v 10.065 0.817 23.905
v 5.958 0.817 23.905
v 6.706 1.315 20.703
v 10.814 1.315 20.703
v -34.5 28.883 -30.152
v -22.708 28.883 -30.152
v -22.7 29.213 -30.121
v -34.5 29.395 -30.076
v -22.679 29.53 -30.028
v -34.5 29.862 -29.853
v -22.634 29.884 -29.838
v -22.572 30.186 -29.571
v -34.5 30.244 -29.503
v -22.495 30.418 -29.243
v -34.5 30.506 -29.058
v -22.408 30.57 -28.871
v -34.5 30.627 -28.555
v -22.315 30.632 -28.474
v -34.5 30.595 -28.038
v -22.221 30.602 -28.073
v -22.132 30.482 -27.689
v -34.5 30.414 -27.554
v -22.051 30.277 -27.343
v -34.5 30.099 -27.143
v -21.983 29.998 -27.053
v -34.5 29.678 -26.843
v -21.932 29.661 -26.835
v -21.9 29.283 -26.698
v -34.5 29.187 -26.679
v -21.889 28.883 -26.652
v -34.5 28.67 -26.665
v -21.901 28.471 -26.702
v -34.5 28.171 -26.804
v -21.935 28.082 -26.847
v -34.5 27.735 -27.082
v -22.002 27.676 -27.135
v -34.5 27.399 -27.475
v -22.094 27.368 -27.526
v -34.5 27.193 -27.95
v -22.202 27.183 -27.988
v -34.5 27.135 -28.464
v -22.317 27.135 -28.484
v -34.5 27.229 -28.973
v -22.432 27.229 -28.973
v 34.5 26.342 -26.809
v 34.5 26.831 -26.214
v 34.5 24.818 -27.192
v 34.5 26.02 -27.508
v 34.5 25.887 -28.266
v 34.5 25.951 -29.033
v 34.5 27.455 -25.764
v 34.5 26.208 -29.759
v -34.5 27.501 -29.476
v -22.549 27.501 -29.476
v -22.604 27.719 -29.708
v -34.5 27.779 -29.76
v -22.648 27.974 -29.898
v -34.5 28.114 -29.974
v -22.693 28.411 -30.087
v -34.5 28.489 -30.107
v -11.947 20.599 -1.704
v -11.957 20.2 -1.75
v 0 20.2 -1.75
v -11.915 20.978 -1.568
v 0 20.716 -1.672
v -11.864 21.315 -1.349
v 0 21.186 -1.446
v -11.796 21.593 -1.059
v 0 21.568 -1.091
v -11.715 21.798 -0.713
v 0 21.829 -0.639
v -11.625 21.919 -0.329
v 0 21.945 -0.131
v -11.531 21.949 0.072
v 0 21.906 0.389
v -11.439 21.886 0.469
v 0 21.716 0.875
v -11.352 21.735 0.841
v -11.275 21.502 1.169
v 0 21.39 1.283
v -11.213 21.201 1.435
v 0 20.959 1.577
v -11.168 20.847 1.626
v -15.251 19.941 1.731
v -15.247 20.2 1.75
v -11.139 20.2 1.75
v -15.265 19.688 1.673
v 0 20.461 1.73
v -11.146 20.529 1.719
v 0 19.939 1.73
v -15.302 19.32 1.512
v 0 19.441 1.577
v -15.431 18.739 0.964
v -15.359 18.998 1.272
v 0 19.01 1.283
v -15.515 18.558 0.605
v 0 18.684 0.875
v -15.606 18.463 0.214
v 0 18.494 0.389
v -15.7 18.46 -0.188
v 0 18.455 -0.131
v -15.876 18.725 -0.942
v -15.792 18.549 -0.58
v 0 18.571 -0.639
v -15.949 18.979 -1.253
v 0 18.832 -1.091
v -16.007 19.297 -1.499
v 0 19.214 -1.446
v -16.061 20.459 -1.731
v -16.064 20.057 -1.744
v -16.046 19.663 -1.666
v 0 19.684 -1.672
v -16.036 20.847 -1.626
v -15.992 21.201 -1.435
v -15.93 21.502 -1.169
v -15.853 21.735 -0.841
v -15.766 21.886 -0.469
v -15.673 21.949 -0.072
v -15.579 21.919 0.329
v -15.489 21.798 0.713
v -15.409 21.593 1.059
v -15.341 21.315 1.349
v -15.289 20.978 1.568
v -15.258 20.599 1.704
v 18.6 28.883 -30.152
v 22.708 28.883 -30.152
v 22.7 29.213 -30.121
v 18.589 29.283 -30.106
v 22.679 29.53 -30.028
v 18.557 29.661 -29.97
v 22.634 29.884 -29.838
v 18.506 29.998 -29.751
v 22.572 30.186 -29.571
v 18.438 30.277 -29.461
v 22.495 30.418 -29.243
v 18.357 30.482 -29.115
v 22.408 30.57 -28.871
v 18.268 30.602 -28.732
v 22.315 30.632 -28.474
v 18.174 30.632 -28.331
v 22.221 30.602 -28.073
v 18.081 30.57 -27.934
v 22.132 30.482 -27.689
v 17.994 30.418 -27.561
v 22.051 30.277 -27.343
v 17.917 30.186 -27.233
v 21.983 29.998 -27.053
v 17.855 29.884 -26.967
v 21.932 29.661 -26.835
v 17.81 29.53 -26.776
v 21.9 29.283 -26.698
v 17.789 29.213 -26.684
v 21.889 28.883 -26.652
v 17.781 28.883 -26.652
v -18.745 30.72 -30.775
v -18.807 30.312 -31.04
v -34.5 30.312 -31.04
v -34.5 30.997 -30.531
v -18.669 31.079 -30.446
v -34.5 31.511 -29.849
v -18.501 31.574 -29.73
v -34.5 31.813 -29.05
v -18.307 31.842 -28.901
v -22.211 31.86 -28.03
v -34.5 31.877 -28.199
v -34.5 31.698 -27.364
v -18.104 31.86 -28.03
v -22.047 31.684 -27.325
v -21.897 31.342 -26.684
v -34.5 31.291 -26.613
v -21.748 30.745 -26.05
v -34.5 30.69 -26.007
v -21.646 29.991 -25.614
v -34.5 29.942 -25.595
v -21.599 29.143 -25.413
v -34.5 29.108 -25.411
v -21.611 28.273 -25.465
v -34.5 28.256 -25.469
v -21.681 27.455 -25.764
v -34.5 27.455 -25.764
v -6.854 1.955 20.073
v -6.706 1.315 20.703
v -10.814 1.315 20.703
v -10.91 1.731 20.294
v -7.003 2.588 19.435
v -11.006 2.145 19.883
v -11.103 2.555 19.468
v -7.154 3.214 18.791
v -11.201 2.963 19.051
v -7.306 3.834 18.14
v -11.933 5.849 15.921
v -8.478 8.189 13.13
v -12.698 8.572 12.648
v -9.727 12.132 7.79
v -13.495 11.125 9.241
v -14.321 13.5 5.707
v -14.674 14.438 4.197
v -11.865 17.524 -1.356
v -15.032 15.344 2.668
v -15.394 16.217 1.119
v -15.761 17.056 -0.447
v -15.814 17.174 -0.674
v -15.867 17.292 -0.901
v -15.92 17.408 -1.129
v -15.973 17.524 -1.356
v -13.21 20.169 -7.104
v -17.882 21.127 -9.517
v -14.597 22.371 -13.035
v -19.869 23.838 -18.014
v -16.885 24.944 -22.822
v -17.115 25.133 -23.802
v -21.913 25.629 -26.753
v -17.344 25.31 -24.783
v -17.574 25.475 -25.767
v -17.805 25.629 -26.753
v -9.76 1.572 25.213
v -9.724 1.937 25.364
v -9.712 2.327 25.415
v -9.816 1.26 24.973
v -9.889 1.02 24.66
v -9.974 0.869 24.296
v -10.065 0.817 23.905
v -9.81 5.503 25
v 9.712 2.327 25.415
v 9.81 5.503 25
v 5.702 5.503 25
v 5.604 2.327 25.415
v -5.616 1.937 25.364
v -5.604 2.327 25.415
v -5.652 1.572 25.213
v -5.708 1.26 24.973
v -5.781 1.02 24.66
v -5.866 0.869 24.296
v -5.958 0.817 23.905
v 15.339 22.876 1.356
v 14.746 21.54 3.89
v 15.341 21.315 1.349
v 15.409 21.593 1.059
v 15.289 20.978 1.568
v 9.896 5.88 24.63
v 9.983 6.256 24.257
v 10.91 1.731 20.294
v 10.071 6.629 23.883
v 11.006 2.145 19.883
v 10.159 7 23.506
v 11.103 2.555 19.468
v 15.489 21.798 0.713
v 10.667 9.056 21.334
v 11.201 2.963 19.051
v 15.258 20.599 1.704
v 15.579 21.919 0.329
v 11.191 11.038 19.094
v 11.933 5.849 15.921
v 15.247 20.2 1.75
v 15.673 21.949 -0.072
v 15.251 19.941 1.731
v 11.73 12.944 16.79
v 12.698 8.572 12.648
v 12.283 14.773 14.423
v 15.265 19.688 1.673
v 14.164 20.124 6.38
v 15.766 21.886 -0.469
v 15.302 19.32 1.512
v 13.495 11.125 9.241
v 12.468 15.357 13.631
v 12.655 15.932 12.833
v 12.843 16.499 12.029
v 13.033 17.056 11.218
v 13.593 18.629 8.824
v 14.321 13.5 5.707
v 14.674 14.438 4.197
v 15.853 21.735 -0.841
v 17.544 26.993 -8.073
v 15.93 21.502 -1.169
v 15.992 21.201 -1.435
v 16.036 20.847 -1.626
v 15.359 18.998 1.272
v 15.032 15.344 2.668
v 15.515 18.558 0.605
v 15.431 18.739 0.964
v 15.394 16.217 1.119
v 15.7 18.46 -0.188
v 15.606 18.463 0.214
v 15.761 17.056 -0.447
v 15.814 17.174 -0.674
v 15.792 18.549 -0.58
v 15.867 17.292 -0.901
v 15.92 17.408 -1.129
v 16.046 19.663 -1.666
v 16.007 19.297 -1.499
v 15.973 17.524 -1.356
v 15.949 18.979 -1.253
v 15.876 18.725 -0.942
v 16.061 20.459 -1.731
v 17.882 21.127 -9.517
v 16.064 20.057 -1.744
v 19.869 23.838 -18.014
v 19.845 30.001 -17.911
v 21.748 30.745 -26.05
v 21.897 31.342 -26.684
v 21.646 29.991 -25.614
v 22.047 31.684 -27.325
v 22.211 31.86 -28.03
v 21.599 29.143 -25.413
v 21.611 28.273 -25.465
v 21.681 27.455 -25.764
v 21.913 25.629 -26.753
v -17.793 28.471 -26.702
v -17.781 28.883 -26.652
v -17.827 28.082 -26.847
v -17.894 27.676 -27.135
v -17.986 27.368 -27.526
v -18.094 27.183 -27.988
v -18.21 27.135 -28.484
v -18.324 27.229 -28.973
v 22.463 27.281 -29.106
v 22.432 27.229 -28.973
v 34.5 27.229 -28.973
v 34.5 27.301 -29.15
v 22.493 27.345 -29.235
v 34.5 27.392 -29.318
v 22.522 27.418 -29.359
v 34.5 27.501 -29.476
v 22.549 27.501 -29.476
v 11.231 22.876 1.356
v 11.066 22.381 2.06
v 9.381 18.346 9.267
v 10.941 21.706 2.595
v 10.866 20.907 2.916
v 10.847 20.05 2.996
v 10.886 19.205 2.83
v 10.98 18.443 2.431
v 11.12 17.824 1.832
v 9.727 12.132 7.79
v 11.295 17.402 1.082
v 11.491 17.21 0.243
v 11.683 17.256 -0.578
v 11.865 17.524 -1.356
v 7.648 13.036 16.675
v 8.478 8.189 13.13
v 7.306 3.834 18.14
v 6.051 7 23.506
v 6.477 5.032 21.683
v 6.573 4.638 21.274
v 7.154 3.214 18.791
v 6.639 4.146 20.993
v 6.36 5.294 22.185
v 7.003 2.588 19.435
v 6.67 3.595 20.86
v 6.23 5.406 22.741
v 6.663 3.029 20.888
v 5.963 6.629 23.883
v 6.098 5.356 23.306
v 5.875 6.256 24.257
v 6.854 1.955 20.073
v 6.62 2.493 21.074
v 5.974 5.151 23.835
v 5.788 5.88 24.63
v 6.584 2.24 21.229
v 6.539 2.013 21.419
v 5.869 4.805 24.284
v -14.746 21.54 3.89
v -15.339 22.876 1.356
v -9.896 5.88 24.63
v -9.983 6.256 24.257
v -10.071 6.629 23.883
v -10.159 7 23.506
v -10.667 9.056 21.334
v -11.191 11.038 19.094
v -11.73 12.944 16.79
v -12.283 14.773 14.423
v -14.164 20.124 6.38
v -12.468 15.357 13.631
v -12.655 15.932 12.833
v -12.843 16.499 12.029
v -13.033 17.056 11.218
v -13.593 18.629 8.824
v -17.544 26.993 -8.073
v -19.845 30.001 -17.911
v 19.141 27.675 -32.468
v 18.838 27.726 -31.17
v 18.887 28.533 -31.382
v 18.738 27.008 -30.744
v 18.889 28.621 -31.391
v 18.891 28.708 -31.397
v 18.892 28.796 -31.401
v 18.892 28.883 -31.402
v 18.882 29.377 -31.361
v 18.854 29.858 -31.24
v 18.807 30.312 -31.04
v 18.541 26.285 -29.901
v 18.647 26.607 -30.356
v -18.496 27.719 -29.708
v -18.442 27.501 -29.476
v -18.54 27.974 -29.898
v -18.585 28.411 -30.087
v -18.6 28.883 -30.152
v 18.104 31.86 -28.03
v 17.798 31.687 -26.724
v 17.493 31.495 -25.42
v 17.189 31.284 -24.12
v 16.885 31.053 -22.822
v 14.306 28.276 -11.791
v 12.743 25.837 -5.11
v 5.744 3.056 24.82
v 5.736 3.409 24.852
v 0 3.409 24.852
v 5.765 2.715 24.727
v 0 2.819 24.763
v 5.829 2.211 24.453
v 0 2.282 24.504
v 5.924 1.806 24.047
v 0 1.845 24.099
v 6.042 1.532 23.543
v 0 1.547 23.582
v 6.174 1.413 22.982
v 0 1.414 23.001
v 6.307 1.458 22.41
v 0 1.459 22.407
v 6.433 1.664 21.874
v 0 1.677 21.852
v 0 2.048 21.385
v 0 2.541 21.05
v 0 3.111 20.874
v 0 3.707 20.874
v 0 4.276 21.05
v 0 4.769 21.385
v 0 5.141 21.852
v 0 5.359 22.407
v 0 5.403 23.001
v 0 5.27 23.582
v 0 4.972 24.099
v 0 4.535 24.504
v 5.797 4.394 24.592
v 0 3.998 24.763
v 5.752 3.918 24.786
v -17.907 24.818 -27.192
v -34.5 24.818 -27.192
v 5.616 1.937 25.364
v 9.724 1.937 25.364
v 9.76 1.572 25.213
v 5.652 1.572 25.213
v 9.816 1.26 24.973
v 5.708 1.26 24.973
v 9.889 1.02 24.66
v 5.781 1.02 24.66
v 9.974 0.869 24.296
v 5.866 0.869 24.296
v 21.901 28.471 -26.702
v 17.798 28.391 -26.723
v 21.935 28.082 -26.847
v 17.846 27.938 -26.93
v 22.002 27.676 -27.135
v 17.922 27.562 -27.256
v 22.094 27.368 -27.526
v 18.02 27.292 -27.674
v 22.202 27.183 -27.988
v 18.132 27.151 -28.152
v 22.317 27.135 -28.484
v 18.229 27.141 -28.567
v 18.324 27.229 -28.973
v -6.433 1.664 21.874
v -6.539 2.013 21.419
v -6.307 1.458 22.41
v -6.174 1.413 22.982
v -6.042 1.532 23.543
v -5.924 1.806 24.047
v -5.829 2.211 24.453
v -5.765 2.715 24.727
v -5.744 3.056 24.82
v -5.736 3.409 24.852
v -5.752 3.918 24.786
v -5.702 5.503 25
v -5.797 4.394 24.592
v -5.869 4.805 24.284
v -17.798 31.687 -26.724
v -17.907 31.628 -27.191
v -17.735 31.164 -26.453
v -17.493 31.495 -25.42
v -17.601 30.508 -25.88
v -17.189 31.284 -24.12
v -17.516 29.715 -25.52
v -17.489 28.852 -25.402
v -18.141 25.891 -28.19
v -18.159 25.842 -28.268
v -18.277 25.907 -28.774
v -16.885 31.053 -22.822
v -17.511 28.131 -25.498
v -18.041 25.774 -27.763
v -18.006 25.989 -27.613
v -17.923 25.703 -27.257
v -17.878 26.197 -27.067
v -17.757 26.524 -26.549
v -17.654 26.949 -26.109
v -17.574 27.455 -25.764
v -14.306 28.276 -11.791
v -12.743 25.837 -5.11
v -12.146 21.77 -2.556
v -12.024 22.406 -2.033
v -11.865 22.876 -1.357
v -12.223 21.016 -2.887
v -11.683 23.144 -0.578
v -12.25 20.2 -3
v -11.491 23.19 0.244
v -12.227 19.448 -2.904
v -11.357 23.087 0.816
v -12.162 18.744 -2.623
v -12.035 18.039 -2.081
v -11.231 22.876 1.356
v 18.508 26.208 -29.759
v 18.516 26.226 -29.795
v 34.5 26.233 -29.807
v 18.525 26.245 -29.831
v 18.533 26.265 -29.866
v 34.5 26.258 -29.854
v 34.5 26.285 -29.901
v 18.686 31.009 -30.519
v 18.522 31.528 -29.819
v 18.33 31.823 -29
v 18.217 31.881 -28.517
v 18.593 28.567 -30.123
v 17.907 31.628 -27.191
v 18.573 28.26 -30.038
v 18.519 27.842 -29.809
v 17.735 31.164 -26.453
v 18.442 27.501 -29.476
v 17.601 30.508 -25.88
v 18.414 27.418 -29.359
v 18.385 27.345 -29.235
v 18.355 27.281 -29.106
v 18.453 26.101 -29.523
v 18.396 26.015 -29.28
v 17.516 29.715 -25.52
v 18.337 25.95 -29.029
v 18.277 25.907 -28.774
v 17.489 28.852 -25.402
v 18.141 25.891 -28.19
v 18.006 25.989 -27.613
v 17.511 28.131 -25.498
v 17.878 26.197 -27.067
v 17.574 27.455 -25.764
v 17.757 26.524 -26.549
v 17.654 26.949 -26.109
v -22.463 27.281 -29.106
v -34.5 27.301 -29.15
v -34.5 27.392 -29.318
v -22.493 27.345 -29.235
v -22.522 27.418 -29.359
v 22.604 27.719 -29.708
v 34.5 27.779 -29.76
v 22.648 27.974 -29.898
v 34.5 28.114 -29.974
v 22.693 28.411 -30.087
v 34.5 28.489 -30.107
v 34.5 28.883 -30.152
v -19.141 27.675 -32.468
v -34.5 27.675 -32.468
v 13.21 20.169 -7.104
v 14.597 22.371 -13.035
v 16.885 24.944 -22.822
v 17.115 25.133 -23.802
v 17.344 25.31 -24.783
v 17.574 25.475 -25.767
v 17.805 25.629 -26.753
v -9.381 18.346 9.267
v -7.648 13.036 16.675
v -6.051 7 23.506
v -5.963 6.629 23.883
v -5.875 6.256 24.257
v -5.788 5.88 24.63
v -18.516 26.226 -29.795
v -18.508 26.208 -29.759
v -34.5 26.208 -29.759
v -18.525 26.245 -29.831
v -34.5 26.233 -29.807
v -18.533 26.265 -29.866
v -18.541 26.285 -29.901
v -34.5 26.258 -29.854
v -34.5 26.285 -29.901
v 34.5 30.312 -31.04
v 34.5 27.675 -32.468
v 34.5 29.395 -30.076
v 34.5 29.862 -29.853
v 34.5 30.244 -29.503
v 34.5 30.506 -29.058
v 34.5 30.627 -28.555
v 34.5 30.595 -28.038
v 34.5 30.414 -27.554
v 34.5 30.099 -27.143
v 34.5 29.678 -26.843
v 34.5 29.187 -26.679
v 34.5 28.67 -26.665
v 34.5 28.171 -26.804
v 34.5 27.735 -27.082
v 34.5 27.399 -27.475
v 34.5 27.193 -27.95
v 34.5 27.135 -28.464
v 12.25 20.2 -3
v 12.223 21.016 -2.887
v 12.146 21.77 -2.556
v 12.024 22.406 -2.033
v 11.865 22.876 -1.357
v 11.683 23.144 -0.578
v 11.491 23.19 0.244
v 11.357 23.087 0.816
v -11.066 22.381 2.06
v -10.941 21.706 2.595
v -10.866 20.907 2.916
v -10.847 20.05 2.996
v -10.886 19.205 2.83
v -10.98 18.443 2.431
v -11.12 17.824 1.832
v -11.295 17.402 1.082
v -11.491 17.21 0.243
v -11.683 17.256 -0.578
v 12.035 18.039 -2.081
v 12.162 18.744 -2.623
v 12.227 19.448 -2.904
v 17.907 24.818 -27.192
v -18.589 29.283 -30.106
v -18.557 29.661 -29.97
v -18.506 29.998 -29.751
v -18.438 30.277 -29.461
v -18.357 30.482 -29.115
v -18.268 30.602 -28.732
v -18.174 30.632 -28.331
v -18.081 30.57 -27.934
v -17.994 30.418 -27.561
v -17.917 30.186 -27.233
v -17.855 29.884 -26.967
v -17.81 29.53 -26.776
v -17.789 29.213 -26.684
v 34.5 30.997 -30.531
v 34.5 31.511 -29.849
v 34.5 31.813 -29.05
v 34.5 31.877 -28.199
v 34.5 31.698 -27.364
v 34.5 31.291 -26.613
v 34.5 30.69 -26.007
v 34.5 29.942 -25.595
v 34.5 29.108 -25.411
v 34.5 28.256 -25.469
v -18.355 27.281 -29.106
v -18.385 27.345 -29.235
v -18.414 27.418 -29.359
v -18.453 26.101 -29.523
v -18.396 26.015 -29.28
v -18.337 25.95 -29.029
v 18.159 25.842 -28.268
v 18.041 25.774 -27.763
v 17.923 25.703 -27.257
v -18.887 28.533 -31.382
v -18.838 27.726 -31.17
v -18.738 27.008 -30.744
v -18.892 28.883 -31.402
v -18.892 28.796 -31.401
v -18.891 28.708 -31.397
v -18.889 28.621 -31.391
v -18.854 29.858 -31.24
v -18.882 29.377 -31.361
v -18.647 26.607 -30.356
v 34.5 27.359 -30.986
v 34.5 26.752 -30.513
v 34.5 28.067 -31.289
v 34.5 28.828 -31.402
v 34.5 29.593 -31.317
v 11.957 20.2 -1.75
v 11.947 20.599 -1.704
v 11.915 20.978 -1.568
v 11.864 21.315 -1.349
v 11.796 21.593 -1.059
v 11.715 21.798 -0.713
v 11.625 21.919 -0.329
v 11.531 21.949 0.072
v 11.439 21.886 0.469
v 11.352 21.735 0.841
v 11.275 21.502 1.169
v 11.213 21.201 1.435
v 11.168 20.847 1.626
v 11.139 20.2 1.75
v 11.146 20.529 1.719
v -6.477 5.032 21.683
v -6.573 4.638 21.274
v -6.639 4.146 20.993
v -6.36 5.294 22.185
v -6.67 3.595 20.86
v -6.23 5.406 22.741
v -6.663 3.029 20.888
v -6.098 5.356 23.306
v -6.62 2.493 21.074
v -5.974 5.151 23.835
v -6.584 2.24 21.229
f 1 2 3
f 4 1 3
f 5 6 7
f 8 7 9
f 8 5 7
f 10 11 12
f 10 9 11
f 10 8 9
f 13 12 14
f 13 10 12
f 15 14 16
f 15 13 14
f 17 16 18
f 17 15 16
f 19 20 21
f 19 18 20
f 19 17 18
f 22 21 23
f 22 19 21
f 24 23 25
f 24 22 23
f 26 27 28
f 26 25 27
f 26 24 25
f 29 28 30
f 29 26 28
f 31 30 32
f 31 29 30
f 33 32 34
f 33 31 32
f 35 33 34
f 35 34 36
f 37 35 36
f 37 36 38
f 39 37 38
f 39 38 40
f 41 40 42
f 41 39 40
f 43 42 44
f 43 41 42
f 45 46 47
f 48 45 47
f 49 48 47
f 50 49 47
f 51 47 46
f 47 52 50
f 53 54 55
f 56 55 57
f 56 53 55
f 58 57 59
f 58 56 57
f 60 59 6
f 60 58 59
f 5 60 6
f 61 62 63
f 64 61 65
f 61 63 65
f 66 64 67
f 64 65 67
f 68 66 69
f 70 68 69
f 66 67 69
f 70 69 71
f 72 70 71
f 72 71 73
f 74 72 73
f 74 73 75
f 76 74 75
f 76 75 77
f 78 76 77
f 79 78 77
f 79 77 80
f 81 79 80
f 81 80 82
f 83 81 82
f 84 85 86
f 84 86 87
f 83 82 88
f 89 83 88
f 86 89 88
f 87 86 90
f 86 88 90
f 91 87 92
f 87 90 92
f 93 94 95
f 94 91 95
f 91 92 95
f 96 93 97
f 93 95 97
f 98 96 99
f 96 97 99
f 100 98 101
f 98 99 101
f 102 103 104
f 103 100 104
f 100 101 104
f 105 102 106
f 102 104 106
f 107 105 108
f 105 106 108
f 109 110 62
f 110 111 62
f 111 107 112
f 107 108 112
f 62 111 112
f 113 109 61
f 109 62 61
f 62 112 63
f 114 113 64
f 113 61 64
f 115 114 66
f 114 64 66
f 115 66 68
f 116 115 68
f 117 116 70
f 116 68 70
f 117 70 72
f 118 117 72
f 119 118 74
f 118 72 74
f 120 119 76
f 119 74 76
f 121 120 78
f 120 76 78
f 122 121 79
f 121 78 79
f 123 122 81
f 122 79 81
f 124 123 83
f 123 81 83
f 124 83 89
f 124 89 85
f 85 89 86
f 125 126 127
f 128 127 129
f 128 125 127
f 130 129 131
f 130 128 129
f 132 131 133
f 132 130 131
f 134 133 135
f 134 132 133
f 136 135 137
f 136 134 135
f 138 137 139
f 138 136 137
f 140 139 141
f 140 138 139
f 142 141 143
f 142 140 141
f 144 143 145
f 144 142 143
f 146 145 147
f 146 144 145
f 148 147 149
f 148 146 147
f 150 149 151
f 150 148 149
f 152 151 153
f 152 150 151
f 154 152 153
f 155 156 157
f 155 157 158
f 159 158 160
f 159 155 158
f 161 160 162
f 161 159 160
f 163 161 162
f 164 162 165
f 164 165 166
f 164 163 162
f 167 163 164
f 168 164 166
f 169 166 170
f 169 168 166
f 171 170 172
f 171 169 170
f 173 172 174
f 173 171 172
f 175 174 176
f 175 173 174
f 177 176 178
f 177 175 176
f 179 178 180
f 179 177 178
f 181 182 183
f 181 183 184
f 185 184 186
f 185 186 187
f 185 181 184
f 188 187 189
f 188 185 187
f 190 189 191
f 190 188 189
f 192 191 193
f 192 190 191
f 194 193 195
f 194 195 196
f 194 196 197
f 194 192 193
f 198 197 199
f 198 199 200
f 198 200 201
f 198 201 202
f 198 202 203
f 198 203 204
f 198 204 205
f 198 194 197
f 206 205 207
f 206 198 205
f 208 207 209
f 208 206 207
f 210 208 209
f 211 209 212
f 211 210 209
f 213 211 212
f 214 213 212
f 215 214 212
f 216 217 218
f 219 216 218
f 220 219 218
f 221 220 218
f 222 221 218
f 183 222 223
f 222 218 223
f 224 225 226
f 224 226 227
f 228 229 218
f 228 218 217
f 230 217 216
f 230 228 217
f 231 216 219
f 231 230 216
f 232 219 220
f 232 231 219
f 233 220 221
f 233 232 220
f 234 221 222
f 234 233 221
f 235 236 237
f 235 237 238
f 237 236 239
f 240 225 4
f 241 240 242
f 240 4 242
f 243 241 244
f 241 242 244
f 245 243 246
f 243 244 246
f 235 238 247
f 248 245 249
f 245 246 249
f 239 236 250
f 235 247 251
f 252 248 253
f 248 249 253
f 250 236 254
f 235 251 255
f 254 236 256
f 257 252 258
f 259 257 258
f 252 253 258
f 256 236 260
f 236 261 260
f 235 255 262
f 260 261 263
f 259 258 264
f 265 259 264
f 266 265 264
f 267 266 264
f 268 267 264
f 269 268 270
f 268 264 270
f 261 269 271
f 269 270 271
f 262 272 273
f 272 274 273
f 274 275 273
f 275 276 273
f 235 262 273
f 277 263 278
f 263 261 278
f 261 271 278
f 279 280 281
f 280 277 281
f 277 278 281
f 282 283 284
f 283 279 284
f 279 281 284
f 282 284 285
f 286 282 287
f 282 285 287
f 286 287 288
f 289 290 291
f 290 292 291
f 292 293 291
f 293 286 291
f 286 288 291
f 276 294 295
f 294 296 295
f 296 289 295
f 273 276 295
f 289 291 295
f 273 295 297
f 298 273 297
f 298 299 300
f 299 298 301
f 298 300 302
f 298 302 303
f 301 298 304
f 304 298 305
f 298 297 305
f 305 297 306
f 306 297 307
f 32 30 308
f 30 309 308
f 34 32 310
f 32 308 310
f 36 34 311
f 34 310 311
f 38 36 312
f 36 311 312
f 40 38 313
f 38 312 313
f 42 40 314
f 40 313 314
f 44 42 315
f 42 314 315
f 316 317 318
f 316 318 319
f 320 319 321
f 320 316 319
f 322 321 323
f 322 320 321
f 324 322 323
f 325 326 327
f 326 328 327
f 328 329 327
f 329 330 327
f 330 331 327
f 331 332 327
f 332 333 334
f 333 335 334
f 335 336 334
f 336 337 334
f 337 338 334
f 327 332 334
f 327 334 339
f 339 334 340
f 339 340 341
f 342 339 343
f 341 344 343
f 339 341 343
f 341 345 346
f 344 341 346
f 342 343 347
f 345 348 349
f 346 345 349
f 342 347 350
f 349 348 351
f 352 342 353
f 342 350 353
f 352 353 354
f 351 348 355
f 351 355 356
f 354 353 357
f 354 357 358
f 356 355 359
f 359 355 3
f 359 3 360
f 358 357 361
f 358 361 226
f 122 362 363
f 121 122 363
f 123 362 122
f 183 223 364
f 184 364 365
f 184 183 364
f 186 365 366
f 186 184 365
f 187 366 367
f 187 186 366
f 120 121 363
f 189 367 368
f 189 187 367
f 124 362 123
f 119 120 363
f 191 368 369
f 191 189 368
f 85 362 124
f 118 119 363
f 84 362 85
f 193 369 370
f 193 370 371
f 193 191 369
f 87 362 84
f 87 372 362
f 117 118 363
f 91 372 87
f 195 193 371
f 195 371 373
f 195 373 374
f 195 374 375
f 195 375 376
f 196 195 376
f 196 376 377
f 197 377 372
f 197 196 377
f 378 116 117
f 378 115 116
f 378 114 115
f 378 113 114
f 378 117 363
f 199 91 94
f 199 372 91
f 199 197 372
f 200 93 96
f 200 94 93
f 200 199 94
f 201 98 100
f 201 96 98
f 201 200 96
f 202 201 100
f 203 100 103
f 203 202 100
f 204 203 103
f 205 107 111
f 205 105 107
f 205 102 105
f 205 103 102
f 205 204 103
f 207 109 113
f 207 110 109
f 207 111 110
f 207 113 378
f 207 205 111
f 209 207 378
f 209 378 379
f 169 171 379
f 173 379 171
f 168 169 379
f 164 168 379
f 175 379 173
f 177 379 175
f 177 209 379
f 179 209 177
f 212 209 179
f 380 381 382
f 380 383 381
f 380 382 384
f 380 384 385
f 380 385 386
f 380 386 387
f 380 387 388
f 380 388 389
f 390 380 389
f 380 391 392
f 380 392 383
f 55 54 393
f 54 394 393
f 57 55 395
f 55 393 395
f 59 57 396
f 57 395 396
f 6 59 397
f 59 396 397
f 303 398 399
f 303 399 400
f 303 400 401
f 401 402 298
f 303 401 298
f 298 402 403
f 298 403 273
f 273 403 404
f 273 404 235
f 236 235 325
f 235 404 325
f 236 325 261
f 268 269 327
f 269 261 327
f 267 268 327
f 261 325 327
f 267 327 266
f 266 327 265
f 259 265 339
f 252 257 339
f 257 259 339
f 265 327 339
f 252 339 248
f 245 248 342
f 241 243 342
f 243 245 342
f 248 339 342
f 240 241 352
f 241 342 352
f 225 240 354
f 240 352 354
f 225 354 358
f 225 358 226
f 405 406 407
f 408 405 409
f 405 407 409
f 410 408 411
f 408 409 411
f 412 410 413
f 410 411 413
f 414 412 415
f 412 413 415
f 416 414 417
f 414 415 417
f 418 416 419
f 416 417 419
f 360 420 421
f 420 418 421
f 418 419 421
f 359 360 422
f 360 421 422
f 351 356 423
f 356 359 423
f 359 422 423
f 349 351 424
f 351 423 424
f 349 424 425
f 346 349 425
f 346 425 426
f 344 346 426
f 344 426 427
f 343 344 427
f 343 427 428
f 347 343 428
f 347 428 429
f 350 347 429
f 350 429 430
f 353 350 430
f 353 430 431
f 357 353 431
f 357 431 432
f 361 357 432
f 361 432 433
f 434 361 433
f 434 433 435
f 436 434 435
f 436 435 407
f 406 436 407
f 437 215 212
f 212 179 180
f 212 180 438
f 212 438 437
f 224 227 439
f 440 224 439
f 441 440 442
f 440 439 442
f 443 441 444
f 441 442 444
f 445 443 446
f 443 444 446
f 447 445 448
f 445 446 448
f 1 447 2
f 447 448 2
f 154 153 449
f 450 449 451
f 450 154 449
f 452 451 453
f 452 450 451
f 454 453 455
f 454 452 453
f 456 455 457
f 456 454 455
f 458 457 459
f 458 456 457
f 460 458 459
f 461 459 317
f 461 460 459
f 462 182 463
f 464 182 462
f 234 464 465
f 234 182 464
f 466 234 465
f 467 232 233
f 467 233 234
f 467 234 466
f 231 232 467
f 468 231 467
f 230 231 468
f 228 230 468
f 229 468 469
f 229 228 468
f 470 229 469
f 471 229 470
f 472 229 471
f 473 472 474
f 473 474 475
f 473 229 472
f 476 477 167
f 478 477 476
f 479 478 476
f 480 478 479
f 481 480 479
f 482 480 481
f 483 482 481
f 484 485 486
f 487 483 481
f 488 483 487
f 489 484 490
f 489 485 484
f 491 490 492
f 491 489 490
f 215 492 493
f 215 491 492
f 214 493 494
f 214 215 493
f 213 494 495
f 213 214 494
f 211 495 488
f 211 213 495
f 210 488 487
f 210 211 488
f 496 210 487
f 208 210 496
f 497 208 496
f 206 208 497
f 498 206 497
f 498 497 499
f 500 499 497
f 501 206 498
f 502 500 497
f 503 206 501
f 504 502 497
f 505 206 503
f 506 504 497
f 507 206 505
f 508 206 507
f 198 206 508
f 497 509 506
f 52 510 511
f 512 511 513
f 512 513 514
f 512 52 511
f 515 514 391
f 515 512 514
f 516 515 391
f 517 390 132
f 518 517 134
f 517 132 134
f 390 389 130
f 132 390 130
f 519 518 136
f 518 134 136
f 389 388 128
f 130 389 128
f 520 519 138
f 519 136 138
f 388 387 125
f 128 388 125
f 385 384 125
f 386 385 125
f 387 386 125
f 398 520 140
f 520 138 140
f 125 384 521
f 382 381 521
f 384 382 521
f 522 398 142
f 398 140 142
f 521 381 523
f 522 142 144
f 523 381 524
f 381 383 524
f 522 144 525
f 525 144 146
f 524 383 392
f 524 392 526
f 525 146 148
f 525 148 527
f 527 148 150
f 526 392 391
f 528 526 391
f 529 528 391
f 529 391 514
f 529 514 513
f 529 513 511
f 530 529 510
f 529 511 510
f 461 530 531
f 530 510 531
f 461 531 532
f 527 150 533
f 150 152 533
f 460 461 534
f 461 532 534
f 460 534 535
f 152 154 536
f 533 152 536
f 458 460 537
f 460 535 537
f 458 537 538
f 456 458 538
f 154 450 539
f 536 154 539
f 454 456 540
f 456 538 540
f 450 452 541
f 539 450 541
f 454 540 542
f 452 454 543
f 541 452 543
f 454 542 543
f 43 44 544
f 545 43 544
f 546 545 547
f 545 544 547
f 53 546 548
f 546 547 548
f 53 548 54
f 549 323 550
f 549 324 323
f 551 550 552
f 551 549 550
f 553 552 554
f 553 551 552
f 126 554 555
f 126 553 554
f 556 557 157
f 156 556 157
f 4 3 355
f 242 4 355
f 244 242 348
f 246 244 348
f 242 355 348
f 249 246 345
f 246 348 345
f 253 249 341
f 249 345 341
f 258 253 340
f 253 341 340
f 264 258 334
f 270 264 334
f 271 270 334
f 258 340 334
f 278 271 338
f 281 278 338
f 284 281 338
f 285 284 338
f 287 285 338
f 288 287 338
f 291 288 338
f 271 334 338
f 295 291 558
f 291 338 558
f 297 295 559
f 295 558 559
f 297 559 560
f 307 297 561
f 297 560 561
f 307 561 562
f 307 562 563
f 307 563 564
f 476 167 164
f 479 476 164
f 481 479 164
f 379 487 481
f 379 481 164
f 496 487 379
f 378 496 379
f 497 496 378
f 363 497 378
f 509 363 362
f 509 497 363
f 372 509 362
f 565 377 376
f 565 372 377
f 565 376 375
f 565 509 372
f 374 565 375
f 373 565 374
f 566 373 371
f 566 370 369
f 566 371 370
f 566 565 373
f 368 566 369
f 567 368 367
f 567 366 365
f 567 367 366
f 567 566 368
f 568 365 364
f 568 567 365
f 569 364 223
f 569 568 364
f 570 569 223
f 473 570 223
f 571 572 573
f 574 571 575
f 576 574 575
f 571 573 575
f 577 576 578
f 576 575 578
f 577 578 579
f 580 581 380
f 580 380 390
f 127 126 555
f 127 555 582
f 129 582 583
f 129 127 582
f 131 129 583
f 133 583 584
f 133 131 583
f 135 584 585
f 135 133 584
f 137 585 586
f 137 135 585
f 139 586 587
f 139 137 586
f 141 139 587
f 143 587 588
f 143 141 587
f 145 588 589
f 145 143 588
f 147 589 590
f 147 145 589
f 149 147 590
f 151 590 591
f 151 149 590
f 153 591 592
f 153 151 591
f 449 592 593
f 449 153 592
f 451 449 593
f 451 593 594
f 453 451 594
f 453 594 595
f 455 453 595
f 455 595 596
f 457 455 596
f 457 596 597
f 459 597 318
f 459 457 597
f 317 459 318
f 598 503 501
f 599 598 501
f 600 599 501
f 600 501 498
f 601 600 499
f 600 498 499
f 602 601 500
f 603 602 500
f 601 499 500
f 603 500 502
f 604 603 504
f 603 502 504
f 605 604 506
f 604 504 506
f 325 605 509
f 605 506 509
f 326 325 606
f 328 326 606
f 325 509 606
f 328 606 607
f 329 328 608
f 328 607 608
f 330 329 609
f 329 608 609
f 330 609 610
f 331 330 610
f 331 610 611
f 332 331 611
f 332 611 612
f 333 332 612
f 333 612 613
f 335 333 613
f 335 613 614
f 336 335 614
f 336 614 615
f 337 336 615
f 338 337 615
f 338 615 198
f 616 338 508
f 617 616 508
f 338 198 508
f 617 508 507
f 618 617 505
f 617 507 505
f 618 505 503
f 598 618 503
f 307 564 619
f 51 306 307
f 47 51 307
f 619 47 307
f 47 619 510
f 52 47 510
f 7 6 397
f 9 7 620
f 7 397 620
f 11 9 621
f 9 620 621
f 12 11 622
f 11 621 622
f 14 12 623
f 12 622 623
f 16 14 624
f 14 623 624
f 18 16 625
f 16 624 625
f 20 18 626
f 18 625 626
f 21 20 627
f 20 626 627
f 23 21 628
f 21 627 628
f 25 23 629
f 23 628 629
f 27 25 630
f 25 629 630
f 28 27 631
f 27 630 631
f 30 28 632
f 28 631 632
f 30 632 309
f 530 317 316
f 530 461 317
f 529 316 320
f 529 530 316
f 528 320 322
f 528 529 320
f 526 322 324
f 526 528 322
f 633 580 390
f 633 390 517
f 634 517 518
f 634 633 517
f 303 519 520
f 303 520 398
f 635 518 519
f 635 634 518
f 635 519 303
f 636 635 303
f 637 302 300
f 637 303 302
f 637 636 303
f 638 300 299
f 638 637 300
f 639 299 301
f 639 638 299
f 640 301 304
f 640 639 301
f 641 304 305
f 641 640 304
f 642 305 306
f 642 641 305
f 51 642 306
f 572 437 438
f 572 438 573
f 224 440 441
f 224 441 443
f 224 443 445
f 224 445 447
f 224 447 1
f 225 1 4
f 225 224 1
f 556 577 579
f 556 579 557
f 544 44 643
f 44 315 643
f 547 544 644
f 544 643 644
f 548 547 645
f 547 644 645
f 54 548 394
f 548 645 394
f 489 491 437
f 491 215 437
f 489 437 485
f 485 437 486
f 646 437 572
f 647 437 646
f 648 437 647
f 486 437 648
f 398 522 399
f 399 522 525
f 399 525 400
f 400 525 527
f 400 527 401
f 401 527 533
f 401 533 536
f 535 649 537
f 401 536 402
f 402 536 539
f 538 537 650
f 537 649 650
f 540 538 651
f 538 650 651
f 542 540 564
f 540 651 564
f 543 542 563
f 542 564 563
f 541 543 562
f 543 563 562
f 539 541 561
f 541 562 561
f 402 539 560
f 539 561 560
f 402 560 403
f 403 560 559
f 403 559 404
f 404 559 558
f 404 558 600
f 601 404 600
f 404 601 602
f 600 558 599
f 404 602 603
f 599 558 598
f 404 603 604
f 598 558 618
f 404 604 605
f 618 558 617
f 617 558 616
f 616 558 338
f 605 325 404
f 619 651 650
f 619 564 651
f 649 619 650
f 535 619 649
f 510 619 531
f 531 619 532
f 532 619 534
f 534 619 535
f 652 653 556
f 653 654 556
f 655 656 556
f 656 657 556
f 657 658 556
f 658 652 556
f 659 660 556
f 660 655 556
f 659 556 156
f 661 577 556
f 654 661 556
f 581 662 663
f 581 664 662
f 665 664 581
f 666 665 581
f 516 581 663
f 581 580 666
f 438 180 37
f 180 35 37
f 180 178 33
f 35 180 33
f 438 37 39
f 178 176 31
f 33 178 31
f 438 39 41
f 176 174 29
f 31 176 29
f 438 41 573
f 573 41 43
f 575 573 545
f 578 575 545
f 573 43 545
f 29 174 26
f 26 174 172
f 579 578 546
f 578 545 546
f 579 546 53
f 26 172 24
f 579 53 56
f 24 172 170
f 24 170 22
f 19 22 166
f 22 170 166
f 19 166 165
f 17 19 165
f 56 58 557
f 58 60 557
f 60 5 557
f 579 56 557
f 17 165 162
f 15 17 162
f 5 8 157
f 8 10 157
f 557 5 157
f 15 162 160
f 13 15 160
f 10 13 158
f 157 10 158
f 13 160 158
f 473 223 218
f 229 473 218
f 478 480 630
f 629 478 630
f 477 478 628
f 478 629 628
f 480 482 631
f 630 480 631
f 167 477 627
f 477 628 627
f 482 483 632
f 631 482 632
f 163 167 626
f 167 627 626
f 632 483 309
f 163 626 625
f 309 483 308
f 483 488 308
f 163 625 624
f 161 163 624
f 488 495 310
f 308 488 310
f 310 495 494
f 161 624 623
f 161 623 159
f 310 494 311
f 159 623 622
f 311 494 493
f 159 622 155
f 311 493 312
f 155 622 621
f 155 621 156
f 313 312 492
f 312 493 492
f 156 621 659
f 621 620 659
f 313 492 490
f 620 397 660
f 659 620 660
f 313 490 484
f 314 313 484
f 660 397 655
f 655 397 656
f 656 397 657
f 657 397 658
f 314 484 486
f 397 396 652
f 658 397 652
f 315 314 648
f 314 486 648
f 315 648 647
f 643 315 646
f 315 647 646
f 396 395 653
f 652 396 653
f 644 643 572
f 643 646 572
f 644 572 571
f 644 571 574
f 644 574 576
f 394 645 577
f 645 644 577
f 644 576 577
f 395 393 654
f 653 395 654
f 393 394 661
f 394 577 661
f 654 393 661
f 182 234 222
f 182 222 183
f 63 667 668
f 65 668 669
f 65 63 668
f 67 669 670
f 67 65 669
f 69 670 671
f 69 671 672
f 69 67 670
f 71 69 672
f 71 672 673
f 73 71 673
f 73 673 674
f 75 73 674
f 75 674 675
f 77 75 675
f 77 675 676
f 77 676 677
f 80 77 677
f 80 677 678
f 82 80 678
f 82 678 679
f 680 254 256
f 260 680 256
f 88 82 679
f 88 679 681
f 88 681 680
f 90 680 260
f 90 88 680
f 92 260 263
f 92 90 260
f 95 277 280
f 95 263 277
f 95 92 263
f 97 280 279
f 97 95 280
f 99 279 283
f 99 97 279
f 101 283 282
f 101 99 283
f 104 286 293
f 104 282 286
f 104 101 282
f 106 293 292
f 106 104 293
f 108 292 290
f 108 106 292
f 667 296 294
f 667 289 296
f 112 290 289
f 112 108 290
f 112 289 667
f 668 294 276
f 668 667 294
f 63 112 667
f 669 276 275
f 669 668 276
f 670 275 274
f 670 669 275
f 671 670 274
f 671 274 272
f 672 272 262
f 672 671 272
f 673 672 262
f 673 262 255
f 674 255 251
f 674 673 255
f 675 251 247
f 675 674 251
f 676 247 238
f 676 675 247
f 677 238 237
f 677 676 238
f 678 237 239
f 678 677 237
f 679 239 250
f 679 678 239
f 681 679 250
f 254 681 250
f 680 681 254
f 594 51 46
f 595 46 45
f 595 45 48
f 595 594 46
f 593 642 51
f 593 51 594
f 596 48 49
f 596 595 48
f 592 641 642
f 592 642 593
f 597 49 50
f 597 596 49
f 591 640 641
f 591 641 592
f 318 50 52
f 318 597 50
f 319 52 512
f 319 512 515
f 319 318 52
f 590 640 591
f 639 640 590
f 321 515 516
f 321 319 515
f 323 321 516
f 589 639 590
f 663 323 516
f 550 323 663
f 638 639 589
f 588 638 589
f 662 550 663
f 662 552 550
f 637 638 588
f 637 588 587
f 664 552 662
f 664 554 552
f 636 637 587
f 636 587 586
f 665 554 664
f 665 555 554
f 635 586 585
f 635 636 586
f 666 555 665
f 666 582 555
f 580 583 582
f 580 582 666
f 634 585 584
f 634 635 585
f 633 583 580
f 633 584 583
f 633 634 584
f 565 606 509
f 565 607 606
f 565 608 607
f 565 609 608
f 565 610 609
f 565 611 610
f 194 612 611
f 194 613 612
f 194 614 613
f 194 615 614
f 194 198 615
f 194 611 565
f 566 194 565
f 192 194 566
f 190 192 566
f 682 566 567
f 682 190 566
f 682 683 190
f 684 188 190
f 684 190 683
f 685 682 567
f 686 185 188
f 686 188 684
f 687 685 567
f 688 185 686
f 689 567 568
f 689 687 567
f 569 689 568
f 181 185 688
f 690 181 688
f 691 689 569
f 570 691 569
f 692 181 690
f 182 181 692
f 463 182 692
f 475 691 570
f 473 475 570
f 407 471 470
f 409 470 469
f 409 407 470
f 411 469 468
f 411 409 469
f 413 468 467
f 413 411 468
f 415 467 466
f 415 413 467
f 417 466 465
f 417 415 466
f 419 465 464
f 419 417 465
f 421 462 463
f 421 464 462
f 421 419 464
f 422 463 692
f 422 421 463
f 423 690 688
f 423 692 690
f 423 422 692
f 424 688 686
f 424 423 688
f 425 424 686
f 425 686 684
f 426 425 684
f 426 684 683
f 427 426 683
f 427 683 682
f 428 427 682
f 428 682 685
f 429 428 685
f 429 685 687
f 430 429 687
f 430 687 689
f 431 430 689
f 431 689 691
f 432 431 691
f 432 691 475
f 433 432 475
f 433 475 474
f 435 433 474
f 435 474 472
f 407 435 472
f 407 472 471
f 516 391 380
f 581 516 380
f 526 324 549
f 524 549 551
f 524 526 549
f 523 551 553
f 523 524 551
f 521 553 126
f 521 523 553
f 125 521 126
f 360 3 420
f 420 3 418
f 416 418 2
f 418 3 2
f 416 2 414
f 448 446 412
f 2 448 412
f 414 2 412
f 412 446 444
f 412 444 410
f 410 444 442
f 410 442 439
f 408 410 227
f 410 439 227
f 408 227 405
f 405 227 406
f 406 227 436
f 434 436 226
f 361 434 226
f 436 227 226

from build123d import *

# Parameters (mm, degrees)
CROQUIS3_R                        = 3
CROQUIS3_R_2                      = 1.75
SALIENTE_EXTRUIR1_DEPTH           = 25
SALIENTE_EXTRUIR1_2_DEPTH         = 25
SALIENTE_EXTRUIR2_DEPTH           = 5
CROQUIS6_R                        = 3
SALIENTE_EXTRUIR3_DEPTH           = 10
CROQUIS7_R                        = 1.75
CORTAR_EXTRUIR1_DEPTH             = 10
SALIENTE_EXTRUIR4_DEPTH           = 35
SALIENTE_EXTRUIR4_DEPTH_BACK      = 4
CORTAR_EXTRUIR2_DEPTH             = 35
CORTAR_EXTRUIR3_DEPTH             = 35
CROQUIS11_R                       = 1.75
CORTAR_EXTRUIR4_DEPTH             = 75.850885973
CHAFL_N1_SIZE                     = 2
REDONDEO2_START                   = -5.0000001
REDONDEO2_DEPTH                   = 10.0000002
CROQUIS15_R                       = 3
CROQUIS15_R_2                     = 1.75
SALIENTE_EXTRUIR7_DEPTH           = 34.5
CORTAR_EXTRUIR6_DEPTH             = 75.850885889
CROQUIS17_W                       = 58.035388513
CROQUIS17_H                       = 46.523798752
CORTAR_EXTRUIR7_DEPTH             = 89.512139195
CROQUIS18_W                       = 44.423903472
CROQUIS18_H                       = 36.103655843
CORTAR_EXTRUIR8_DEPTH             = 69.319773447
CORTAR_EXTRUIR9_REACH             = 58.506
CROQUIS19_W                       = 12.504575714
CROQUIS19_H                       = 15.8167713
CORTAR_EXTRUIR9_DIRECTION_2_REACH = 58.506
CORTAR_EXTRUIR10_DEPTH            = 57.505797104
CORTAR_EXTRUIR10_DEPTH_BACK       = 57.505797104
SALIENTE_EXTRUIR8_START           = 5.604429129
SALIENTE_EXTRUIR8_DEPTH           = 5.209978082
SALIENTE_EXTRUIR8_START_2         = 9
SALIENTE_EXTRUIR8_2_OUTLINE_W     = 8
SALIENTE_EXTRUIR8_2_OUTLINE_H     = 9
SALIENTE_EXTRUIR8_2_DEPTH         = 2.244792929
SALIENTE_EXTRUIR8_START_3         = 15.244792929
SALIENTE_EXTRUIR8_3_OUTLINE_W     = 8
SALIENTE_EXTRUIR8_3_OUTLINE_H     = 9
SALIENTE_EXTRUIR8_3_DEPTH         = 1.755207071
SALIENTE_EXTRUIR9_REACH           = 58.506
CROQUIS27_R                       = 2
SALIENTE_EXTRUIR10_REACH          = 84.241


with BuildPart() as part:
    # Croquis3 → Saliente-Extruir1 (new body)
    with BuildSketch(Plane(origin=(0, 0, 0), x_dir=(0, 0, -1), z_dir=(1, 0, 0))):
        with Locations((0, 20.2)):
            Circle(CROQUIS3_R)
        with Locations((0, 20.2)):
            Circle(CROQUIS3_R_2, mode=Mode.SUBTRACT)
    extrude(amount=SALIENTE_EXTRUIR1_DEPTH)


with BuildPart() as body_2:
    # Croquis3 → Saliente-Extruir1 2 (new body)
    with BuildSketch(Plane(origin=(0, 0, 0), x_dir=(0, 0, -1), z_dir=(1, 0, 0))):
        with Locations((28.402251252, 28.88343963)):
            Circle(CROQUIS3_R)
        with Locations((28.402251252, 28.88343963)):
            Circle(CROQUIS3_R_2, mode=Mode.SUBTRACT)
    extrude(amount=SALIENTE_EXTRUIR1_2_DEPTH)


with BuildPart() as body_3:
    # Croquis5 → Saliente-Extruir2 (new, symmetric)
    with BuildSketch(Plane(origin=(0, 0, 0), x_dir=(1, 0, 0), z_dir=(0, 1, 0))):
        with BuildLine():
            Line((0, -26), (0, -30))
            add(Edge.make_bspline(
                [(0, -30), (3.306526268, -30), (16.53263134, -29.831217065), (35.997648536, -28.565345051), (52.057120801, -26.333176426), (58.766277483, -25.109762555), (60, -24.873829164)],
                knots=[4.71238898, 4.71238898, 4.71238898, 4.71238898, 4.810563751, 5.105088062, 5.301437603, 5.346535107, 5.346535107, 5.346535107, 5.346535107], degree=3))
            Line((60, -24.873829164), (60, -20.8))
            add(Edge.make_bspline(
                [(0, -26), (33.333333333, -26), (60, -20.8)],
                knots=[4.71238898, 4.71238898, 4.71238898, 5.355890089, 5.355890089, 5.355890089], degree=2, weights=[1, 0.948683298, 1]))
        make_face()
    extrude(amount=SALIENTE_EXTRUIR2_DEPTH, both=True)

    # Croquis6 → Saliente-Extruir3 (add)
    with BuildSketch(Plane.XY.offset(26)):
        with Locations((38, 0)):
            Circle(CROQUIS6_R)
    extrude(amount=-SALIENTE_EXTRUIR3_DEPTH)

    # Croquis7 → Cortar-Extruir1 (cut)
    with BuildSketch(Plane(origin=(0, 0, 16), x_dir=(-1, 0, 0), z_dir=(0, 0, -1))):
        with Locations((-38, 0)):
            Circle(CROQUIS7_R)
    extrude(amount=-CORTAR_EXTRUIR1_DEPTH, mode=Mode.SUBTRACT)


with BuildPart() as body_4:
    # Croquis8 → Saliente-Extruir4 (new, two sides: drawn at the far end of the back side and taken through both)
    with BuildSketch(Plane(origin=(0, 0, 0), x_dir=(1, 0, 0), z_dir=(0, 1, 0)).offset(-SALIENTE_EXTRUIR4_DEPTH_BACK)):
        Polygon((18.892070983, 31.402251252), (5, -28), (9.107929017, -28), (23, 31.402251252), align=None)
    extrude(amount=SALIENTE_EXTRUIR4_DEPTH + SALIENTE_EXTRUIR4_DEPTH_BACK)

    # Croquis9 → Cortar-Extruir2 (cut)
    with BuildSketch(Plane(origin=(0, 0, 0), x_dir=(0, 0, -1), z_dir=(1, 0, 0))):
        with BuildLine():
            ThreePointArc((23.072173604, 71.551815183), (-21.61922461, 57.42408075), (-58.358460899, 28.318368742))
            ThreePointArc((-58.358460899, 28.318368742), (-54.318368742, -32.358460899), (6.358460899, -28.318368742))
            ThreePointArc((6.358460899, -28.318368742), (18.708788399, -18.534140443), (33.7323289, -13.784935922))
            ThreePointArc((33.7323289, -13.784935922), (71.070626804, 34.213517278), (23.072173604, 71.551815183))
        make_face()
        with BuildLine():
            ThreePointArc((28.03038537, 31.860303041), (-2.862009257, 22.094675544), (-28.257567039, 1.975700145))
            ThreePointArc((-28.257567039, 1.975700145), (-27.975700145, -2.257567039), (-23.742432961, -1.975700145))
            ThreePointArc((-23.742432961, -1.975700145), (-0.048426954, 16.795264763), (28.774117135, 25.90657622))
            ThreePointArc((28.774117135, 25.90657622), (31.379114663, 29.255305513), (28.03038537, 31.860303041))
        make_face(mode=Mode.SUBTRACT)
    extrude(amount=CORTAR_EXTRUIR2_DEPTH, mode=Mode.SUBTRACT)


with BuildPart() as cortar_extruir3_tool:
    # Croquis10 → Cortar-Extruir3 (new body)
    with BuildSketch(Plane(origin=(0, 0, 0), x_dir=(1, 0, 0), z_dir=(0, 1, 0))):
        Polygon((14.368051869, -5.50780718), (23.738120218, 34.558440326), (28.571984955, 34.558440326), (28.571984955, -5.50780718), align=None)
    extrude(amount=CORTAR_EXTRUIR3_DEPTH)


with BuildPart() as part_1:
    add(part.part)

    # Cortar-Extruir3: cut by cortar_extruir3_tool
    add(cortar_extruir3_tool.part, mode=Mode.SUBTRACT)


with BuildPart() as body_2_1:
    add(body_2.part)

    # Cortar-Extruir3: cut by cortar_extruir3_tool
    add(cortar_extruir3_tool.part, mode=Mode.SUBTRACT)

    # Combinar1: union body 4, part, body 3
    add(body_4.part)
    add(part_1.part)
    add(body_3.part)

    # Croquis11 → Cortar-Extruir4 (cut, through all)
    with BuildSketch(Plane(origin=(0, 0, 0), x_dir=(0, 0, -1), z_dir=(1, 0, 0))):
        with Locations(Location((28.402251252, 28.88343963, 0), (0, 0, 180))):
            Circle(CROQUIS11_R)
        with Locations(Location((0, 20.2, 0), (0, 0, 180))):
            Circle(CROQUIS11_R)
    extrude(amount=CORTAR_EXTRUIR4_DEPTH, mode=Mode.SUBTRACT)

    # Chaflán1
    chafl_n1_edges = [body_2_1.edges().sort_by_distance(p)[0] for p in [
        (60, -5, 22.836914582),
        (60, 5, 22.836914582),
        (30.12007931, -5, 28.805559056),
        (30.12007931, 5, 28.805559056),
    ]]
    chamfer(chafl_n1_edges, length=CHAFL_N1_SIZE)

    # Redondeo2: read off the stored shape, not the designer's step
    # Redondeo2 outline → Redondeo2 (cut)
    with BuildSketch(Plane(origin=(0, 0, 0), x_dir=(1, 0, 0), z_dir=(0, 1, 0)).offset(REDONDEO2_START)):
        with BuildLine():
            Line((60, -24.873829164), (60, -22.378802425))
            ThreePointArc((60, -22.378802425), (59.301153244, -24.303560526), (57.530204169, -25.331577991))
            add(Edge.make_bspline(
                [(57.530204169, -25.331577991), (58.36173126, -25.182267919), (59.185100773, -25.029668046), (60, -24.873829164)],
                knots=[5.316747273, 5.316747273, 5.316747273, 5.316747273, 5.346535107, 5.346535107, 5.346535107, 5.346535107], degree=3))
        make_face()
    extrude(amount=REDONDEO2_DEPTH, mode=Mode.SUBTRACT)

    # Simetría1: body 2 across plane


with BuildPart() as body_2_2:
    add(body_2_1.part)
    add(body_2_1.part.mirror(Plane(origin=(0, 0, 0), x_dir=(0, 0, 1), z_dir=(1, 0, 0))))

    # Croquis15 → Saliente-Extruir7 (add, symmetric)
    with BuildSketch(Plane(origin=(0, 0, 0), x_dir=(0, 0, -1), z_dir=(1, 0, 0))):
        with Locations((28.402251252, 28.88343963)):
            Circle(CROQUIS15_R)
        with Locations((28.402251252, 28.88343963)):
            Circle(CROQUIS15_R_2, mode=Mode.SUBTRACT)
    extrude(amount=SALIENTE_EXTRUIR7_DEPTH, both=True)

    # Croquis16 → Cortar-Extruir6 (cut, through all)
    with BuildSketch(Plane(origin=(0, 0, 0), x_dir=(1, 0, 0), z_dir=(0, 1, 0))):
        Polygon((-16.885477313, 22.822092006), (-19.378773918, 33.483384445), (19.378773918, 33.483384445), (16.885477313, 22.822092006), align=None)
    extrude(amount=CORTAR_EXTRUIR6_DEPTH, mode=Mode.SUBTRACT)

    # Croquis17 → Cortar-Extruir7 (cut, through all)
    with BuildSketch(Plane(origin=(14.844261295, 0, 3.471544045), x_dir=(0.2277199868274214, 0, -0.9737266595915505), z_dir=(0.9737266595915505, 0, 0.2277199868274214))):
        with Locations((-19.202717709, -6.205565874)):
            Rectangle(CROQUIS17_W, CROQUIS17_H)
    extrude(amount=CORTAR_EXTRUIR7_DEPTH, mode=Mode.SUBTRACT)

    # Croquis18 → Cortar-Extruir8 (cut, through all)
    with BuildSketch(Plane(origin=(-14.844261295, 0, 3.471544045), x_dir=(0.2277199868274214, 0, 0.9737266595915505), z_dir=(-0.9737266595915505, 0, 0.2277199868274214))):
        with Locations((24.508189539, -3.279068715)):
            Rectangle(CROQUIS18_W, CROQUIS18_H)
    extrude(amount=CORTAR_EXTRUIR8_DEPTH, mode=Mode.SUBTRACT)

    # Croquis19 → Cortar-Extruir9 (cut, up to next)
    with BuildSketch(Plane(origin=(0, 0, 0), x_dir=(0, 0, -1), z_dir=(1, 0, 0)), mode=Mode.PRIVATE) as cortar_extruir9_sk1:
        with Locations((-31.252287857, 0.477900731)):
            Rectangle(CROQUIS19_W, CROQUIS19_H)
    cortar_extruir9_tool1 = extrude(cortar_extruir9_sk1.sketch, amount=-CORTAR_EXTRUIR9_REACH, mode=Mode.PRIVATE) & body_2_2.part
    add(cortar_extruir9_tool1.solids().sort_by_distance((0, 0.477901, 31.252288))[0], mode=Mode.SUBTRACT)

    # Croquis19 → Cortar-Extruir9 direction 2 (cut, up to next)
    with BuildSketch(Plane(origin=(0, 0, 0), x_dir=(0, 0, -1), z_dir=(1, 0, 0)), mode=Mode.PRIVATE) as cortar_extruir9_direction_2_sk1:
        with Locations((-31.252287857, 0.477900731)):
            Rectangle(CROQUIS19_W, CROQUIS19_H)
    cortar_extruir9_direction_2_tool1 = extrude(cortar_extruir9_direction_2_sk1.sketch, amount=CORTAR_EXTRUIR9_DIRECTION_2_REACH, mode=Mode.PRIVATE) & body_2_2.part
    add(cortar_extruir9_direction_2_tool1.solids().sort_by_distance((0, 0.477901, 31.252288))[0], mode=Mode.SUBTRACT)

    # Croquis22 → Cortar-Extruir10 (cut, two sides: drawn at the far end of the back side and taken through both)
    with BuildSketch(Plane(origin=(0, 0, 0), x_dir=(0, 0, -1), z_dir=(1, 0, 0)).offset(-CORTAR_EXTRUIR10_DEPTH_BACK)):
        Polygon((-25, 5.502584664), (-20.70312925, 1.31487625), (-20.70312925, -4.672126299), (-25.020021016, -4.672126299), align=None)
    extrude(amount=CORTAR_EXTRUIR10_DEPTH + CORTAR_EXTRUIR10_DEPTH_BACK, mode=Mode.SUBTRACT)

    # Saliente-Extruir8: read off the stored shape, not the designer's step
    # Saliente-Extruir8 outline → Saliente-Extruir8 (add)
    with BuildSketch(Plane(origin=(0, 0, 0), x_dir=(0, 0, -1), z_dir=(1, 0, 0)).offset(SALIENTE_EXTRUIR8_START)):
        with BuildLine():
            ThreePointArc((-25.415471242, 2.327351318), (-24.973202481, 1.259620078), (-23.905471242, 0.817351318))
            Line((-23.905471242, 0.817351318), (-20.70312925, 1.31487625))
            Line((-20.70312925, 1.31487625), (-25, 5.502584664))
            Line((-25, 5.502584664), (-25.415471242, 2.327351318))
        make_face()
    extrude(amount=SALIENTE_EXTRUIR8_DEPTH)

    # Saliente-Extruir8 2 outline → Saliente-Extruir8 2 (cut)
    with BuildSketch(Plane(origin=(0, 0, 0), x_dir=(0, 1, 0), z_dir=(0.9737266595915505, 0, 0.22771998682742112)).offset(SALIENTE_EXTRUIR8_START_2)):
        with Locations((3, 20.5)):
            Rectangle(SALIENTE_EXTRUIR8_2_OUTLINE_W, SALIENTE_EXTRUIR8_2_OUTLINE_H)
    extrude(amount=SALIENTE_EXTRUIR8_2_DEPTH, mode=Mode.SUBTRACT)

    # Saliente-Extruir8 3 outline → Saliente-Extruir8 3 (cut)
    with BuildSketch(Plane(origin=(0, 0, 0), x_dir=(0, 1, 0), z_dir=(0.9737266595915505, 0, 0.22771998682742112)).offset(SALIENTE_EXTRUIR8_START_3)):
        with Locations((3, 20.5)):
            Rectangle(SALIENTE_EXTRUIR8_3_OUTLINE_W, SALIENTE_EXTRUIR8_3_OUTLINE_H)
    extrude(amount=SALIENTE_EXTRUIR8_3_DEPTH, mode=Mode.SUBTRACT)

    # Saliente-Extruir9: up to this plane
    saliente_extruir9_end = Plane(origin=(18.892070983, -4, -31.402251252), z_dir=(-0.9737266595915502, 0, -0.22771998682742178))
    # Croquis27 → Saliente-Extruir9 (add, up to the surface)
    with BuildSketch(Plane(origin=(0, 0, 0), x_dir=(0, 0, -1), z_dir=(1, 0, 0)), mode=Mode.PRIVATE) as saliente_extruir9_sk1:
        with Locations(Location((-22.851564625, 3.408730457, 0), (0, 0, 180))):
            Circle(CROQUIS27_R)
    saliente_extruir9_tool1 = split(extrude(saliente_extruir9_sk1.sketch, amount=SALIENTE_EXTRUIR9_REACH, mode=Mode.PRIVATE), bisect_by=saliente_extruir9_end, keep=Keep.BOTH, mode=Mode.PRIVATE)
    add(saliente_extruir9_tool1.solids().sort_by_distance((0, 3.40873, 22.851565))[0])

    # Simetría2: body 2 across plane


with BuildPart() as body_2_3:
    add(body_2_2.part)
    add(body_2_2.part.mirror(Plane(origin=(0, 0, 0), x_dir=(0, 0, 1), z_dir=(1, 0, 0))))

    # Saliente-Extruir10: up to this plane
    saliente_extruir10_end = Plane(origin=(18.892070983, -4, -31.402251252), z_dir=(-0.9737266595915502, 0, -0.22771998682742178))
    # Croquis28 → Saliente-Extruir10 (add, up to the surface)
    with BuildSketch(Plane(origin=(34.5, 0, 0), x_dir=(0, 0, -1), z_dir=(1, 0, 0)), mode=Mode.PRIVATE) as saliente_extruir10_sk1:
        with BuildLine():
            ThreePointArc((27.066737846, 26.197103102), (26.31824017, 26.725454966), (25.764112295, 27.455075937))
            Line((25.764112295, 27.455075937), (27.191957483, 24.81789464))
            Line((27.191957483, 24.81789464), (29.759019258, 26.207775119))
            ThreePointArc((29.759019258, 26.207775119), (28.41414295, 25.883463199), (27.066737846, 26.197103102))
        make_face()
    saliente_extruir10_tool1 = split(extrude(saliente_extruir10_sk1.sketch, amount=-SALIENTE_EXTRUIR10_REACH, mode=Mode.PRIVATE), bisect_by=saliente_extruir10_end, keep=Keep.BOTH, mode=Mode.PRIVATE)
    add(saliente_extruir10_tool1.solids().sort_by_distance((34.5, 25.725607, -27.460996))[0])
    # Croquis28 → Saliente-Extruir10 (add, up to the surface)
    with BuildSketch(Plane(origin=(34.5, 0, 0), x_dir=(0, 0, -1), z_dir=(1, 0, 0)), mode=Mode.PRIVATE) as saliente_extruir10_sk2:
        with BuildLine():
            Line((28.972595635, 27.22898888), (27.066737846, 26.197103102))
            ThreePointArc((27.066737846, 26.197103102), (28.41414295, 25.883463199), (29.759019258, 26.207775119))
            Line((29.759019258, 26.207775119), (29.901173624, 26.284741548))
            ThreePointArc((29.901173624, 26.284741548), (30.907879247, 27.233643172), (31.381757368, 28.533377772))
            Line((31.381757368, 28.533377772), (29.475899579, 27.501491994))
            ThreePointArc((29.475899579, 27.501491994), (29.235463407, 27.344525238), (28.972595635, 27.22898888))
        make_face()
    saliente_extruir10_tool2 = split(extrude(saliente_extruir10_sk2.sketch, amount=-SALIENTE_EXTRUIR10_REACH, mode=Mode.PRIVATE), bisect_by=saliente_extruir10_end, keep=Keep.BOTH, mode=Mode.PRIVATE)
    add(saliente_extruir10_tool2.solids().sort_by_distance((34.5, 26.907055, -29.472322))[0])
    # Croquis28 → Saliente-Extruir10 (add, up to the surface)
    with BuildSketch(Plane(origin=(34.5, 0, 0), x_dir=(0, 0, -1), z_dir=(1, 0, 0)), mode=Mode.PRIVATE) as saliente_extruir10_sk3:
        with BuildLine():
            Line((32.468235398, 27.674622027), (31.04039021, 30.311803324))
            ThreePointArc((31.04039021, 30.311803324), (31.310379247, 29.620183523), (31.402251252, 28.88343963))
            ThreePointArc((31.402251252, 28.88343963), (31.397123399, 28.708109011), (31.381757368, 28.533377772))
            ThreePointArc((31.381757368, 28.533377772), (30.907879247, 27.233643172), (29.901173624, 26.284741548))
            Line((29.901173624, 26.284741548), (32.468235398, 27.674622027))
        make_face()
    saliente_extruir10_tool3 = split(extrude(saliente_extruir10_sk3.sketch, amount=-SALIENTE_EXTRUIR10_REACH, mode=Mode.PRIVATE), bisect_by=saliente_extruir10_end, keep=Keep.BOTH, mode=Mode.PRIVATE)
    add(saliente_extruir10_tool3.solids().sort_by_distance((34.5, 27.945505, -31.561072))[0])

    # Simetría3: body 2 across plane


with BuildPart() as body_2_4:
    add(body_2_3.part)
    add(body_2_3.part.mirror(Plane(origin=(0, 0, 0), x_dir=(0, 0, 1), z_dir=(1, 0, 0))))


solid = body_2_4.part
